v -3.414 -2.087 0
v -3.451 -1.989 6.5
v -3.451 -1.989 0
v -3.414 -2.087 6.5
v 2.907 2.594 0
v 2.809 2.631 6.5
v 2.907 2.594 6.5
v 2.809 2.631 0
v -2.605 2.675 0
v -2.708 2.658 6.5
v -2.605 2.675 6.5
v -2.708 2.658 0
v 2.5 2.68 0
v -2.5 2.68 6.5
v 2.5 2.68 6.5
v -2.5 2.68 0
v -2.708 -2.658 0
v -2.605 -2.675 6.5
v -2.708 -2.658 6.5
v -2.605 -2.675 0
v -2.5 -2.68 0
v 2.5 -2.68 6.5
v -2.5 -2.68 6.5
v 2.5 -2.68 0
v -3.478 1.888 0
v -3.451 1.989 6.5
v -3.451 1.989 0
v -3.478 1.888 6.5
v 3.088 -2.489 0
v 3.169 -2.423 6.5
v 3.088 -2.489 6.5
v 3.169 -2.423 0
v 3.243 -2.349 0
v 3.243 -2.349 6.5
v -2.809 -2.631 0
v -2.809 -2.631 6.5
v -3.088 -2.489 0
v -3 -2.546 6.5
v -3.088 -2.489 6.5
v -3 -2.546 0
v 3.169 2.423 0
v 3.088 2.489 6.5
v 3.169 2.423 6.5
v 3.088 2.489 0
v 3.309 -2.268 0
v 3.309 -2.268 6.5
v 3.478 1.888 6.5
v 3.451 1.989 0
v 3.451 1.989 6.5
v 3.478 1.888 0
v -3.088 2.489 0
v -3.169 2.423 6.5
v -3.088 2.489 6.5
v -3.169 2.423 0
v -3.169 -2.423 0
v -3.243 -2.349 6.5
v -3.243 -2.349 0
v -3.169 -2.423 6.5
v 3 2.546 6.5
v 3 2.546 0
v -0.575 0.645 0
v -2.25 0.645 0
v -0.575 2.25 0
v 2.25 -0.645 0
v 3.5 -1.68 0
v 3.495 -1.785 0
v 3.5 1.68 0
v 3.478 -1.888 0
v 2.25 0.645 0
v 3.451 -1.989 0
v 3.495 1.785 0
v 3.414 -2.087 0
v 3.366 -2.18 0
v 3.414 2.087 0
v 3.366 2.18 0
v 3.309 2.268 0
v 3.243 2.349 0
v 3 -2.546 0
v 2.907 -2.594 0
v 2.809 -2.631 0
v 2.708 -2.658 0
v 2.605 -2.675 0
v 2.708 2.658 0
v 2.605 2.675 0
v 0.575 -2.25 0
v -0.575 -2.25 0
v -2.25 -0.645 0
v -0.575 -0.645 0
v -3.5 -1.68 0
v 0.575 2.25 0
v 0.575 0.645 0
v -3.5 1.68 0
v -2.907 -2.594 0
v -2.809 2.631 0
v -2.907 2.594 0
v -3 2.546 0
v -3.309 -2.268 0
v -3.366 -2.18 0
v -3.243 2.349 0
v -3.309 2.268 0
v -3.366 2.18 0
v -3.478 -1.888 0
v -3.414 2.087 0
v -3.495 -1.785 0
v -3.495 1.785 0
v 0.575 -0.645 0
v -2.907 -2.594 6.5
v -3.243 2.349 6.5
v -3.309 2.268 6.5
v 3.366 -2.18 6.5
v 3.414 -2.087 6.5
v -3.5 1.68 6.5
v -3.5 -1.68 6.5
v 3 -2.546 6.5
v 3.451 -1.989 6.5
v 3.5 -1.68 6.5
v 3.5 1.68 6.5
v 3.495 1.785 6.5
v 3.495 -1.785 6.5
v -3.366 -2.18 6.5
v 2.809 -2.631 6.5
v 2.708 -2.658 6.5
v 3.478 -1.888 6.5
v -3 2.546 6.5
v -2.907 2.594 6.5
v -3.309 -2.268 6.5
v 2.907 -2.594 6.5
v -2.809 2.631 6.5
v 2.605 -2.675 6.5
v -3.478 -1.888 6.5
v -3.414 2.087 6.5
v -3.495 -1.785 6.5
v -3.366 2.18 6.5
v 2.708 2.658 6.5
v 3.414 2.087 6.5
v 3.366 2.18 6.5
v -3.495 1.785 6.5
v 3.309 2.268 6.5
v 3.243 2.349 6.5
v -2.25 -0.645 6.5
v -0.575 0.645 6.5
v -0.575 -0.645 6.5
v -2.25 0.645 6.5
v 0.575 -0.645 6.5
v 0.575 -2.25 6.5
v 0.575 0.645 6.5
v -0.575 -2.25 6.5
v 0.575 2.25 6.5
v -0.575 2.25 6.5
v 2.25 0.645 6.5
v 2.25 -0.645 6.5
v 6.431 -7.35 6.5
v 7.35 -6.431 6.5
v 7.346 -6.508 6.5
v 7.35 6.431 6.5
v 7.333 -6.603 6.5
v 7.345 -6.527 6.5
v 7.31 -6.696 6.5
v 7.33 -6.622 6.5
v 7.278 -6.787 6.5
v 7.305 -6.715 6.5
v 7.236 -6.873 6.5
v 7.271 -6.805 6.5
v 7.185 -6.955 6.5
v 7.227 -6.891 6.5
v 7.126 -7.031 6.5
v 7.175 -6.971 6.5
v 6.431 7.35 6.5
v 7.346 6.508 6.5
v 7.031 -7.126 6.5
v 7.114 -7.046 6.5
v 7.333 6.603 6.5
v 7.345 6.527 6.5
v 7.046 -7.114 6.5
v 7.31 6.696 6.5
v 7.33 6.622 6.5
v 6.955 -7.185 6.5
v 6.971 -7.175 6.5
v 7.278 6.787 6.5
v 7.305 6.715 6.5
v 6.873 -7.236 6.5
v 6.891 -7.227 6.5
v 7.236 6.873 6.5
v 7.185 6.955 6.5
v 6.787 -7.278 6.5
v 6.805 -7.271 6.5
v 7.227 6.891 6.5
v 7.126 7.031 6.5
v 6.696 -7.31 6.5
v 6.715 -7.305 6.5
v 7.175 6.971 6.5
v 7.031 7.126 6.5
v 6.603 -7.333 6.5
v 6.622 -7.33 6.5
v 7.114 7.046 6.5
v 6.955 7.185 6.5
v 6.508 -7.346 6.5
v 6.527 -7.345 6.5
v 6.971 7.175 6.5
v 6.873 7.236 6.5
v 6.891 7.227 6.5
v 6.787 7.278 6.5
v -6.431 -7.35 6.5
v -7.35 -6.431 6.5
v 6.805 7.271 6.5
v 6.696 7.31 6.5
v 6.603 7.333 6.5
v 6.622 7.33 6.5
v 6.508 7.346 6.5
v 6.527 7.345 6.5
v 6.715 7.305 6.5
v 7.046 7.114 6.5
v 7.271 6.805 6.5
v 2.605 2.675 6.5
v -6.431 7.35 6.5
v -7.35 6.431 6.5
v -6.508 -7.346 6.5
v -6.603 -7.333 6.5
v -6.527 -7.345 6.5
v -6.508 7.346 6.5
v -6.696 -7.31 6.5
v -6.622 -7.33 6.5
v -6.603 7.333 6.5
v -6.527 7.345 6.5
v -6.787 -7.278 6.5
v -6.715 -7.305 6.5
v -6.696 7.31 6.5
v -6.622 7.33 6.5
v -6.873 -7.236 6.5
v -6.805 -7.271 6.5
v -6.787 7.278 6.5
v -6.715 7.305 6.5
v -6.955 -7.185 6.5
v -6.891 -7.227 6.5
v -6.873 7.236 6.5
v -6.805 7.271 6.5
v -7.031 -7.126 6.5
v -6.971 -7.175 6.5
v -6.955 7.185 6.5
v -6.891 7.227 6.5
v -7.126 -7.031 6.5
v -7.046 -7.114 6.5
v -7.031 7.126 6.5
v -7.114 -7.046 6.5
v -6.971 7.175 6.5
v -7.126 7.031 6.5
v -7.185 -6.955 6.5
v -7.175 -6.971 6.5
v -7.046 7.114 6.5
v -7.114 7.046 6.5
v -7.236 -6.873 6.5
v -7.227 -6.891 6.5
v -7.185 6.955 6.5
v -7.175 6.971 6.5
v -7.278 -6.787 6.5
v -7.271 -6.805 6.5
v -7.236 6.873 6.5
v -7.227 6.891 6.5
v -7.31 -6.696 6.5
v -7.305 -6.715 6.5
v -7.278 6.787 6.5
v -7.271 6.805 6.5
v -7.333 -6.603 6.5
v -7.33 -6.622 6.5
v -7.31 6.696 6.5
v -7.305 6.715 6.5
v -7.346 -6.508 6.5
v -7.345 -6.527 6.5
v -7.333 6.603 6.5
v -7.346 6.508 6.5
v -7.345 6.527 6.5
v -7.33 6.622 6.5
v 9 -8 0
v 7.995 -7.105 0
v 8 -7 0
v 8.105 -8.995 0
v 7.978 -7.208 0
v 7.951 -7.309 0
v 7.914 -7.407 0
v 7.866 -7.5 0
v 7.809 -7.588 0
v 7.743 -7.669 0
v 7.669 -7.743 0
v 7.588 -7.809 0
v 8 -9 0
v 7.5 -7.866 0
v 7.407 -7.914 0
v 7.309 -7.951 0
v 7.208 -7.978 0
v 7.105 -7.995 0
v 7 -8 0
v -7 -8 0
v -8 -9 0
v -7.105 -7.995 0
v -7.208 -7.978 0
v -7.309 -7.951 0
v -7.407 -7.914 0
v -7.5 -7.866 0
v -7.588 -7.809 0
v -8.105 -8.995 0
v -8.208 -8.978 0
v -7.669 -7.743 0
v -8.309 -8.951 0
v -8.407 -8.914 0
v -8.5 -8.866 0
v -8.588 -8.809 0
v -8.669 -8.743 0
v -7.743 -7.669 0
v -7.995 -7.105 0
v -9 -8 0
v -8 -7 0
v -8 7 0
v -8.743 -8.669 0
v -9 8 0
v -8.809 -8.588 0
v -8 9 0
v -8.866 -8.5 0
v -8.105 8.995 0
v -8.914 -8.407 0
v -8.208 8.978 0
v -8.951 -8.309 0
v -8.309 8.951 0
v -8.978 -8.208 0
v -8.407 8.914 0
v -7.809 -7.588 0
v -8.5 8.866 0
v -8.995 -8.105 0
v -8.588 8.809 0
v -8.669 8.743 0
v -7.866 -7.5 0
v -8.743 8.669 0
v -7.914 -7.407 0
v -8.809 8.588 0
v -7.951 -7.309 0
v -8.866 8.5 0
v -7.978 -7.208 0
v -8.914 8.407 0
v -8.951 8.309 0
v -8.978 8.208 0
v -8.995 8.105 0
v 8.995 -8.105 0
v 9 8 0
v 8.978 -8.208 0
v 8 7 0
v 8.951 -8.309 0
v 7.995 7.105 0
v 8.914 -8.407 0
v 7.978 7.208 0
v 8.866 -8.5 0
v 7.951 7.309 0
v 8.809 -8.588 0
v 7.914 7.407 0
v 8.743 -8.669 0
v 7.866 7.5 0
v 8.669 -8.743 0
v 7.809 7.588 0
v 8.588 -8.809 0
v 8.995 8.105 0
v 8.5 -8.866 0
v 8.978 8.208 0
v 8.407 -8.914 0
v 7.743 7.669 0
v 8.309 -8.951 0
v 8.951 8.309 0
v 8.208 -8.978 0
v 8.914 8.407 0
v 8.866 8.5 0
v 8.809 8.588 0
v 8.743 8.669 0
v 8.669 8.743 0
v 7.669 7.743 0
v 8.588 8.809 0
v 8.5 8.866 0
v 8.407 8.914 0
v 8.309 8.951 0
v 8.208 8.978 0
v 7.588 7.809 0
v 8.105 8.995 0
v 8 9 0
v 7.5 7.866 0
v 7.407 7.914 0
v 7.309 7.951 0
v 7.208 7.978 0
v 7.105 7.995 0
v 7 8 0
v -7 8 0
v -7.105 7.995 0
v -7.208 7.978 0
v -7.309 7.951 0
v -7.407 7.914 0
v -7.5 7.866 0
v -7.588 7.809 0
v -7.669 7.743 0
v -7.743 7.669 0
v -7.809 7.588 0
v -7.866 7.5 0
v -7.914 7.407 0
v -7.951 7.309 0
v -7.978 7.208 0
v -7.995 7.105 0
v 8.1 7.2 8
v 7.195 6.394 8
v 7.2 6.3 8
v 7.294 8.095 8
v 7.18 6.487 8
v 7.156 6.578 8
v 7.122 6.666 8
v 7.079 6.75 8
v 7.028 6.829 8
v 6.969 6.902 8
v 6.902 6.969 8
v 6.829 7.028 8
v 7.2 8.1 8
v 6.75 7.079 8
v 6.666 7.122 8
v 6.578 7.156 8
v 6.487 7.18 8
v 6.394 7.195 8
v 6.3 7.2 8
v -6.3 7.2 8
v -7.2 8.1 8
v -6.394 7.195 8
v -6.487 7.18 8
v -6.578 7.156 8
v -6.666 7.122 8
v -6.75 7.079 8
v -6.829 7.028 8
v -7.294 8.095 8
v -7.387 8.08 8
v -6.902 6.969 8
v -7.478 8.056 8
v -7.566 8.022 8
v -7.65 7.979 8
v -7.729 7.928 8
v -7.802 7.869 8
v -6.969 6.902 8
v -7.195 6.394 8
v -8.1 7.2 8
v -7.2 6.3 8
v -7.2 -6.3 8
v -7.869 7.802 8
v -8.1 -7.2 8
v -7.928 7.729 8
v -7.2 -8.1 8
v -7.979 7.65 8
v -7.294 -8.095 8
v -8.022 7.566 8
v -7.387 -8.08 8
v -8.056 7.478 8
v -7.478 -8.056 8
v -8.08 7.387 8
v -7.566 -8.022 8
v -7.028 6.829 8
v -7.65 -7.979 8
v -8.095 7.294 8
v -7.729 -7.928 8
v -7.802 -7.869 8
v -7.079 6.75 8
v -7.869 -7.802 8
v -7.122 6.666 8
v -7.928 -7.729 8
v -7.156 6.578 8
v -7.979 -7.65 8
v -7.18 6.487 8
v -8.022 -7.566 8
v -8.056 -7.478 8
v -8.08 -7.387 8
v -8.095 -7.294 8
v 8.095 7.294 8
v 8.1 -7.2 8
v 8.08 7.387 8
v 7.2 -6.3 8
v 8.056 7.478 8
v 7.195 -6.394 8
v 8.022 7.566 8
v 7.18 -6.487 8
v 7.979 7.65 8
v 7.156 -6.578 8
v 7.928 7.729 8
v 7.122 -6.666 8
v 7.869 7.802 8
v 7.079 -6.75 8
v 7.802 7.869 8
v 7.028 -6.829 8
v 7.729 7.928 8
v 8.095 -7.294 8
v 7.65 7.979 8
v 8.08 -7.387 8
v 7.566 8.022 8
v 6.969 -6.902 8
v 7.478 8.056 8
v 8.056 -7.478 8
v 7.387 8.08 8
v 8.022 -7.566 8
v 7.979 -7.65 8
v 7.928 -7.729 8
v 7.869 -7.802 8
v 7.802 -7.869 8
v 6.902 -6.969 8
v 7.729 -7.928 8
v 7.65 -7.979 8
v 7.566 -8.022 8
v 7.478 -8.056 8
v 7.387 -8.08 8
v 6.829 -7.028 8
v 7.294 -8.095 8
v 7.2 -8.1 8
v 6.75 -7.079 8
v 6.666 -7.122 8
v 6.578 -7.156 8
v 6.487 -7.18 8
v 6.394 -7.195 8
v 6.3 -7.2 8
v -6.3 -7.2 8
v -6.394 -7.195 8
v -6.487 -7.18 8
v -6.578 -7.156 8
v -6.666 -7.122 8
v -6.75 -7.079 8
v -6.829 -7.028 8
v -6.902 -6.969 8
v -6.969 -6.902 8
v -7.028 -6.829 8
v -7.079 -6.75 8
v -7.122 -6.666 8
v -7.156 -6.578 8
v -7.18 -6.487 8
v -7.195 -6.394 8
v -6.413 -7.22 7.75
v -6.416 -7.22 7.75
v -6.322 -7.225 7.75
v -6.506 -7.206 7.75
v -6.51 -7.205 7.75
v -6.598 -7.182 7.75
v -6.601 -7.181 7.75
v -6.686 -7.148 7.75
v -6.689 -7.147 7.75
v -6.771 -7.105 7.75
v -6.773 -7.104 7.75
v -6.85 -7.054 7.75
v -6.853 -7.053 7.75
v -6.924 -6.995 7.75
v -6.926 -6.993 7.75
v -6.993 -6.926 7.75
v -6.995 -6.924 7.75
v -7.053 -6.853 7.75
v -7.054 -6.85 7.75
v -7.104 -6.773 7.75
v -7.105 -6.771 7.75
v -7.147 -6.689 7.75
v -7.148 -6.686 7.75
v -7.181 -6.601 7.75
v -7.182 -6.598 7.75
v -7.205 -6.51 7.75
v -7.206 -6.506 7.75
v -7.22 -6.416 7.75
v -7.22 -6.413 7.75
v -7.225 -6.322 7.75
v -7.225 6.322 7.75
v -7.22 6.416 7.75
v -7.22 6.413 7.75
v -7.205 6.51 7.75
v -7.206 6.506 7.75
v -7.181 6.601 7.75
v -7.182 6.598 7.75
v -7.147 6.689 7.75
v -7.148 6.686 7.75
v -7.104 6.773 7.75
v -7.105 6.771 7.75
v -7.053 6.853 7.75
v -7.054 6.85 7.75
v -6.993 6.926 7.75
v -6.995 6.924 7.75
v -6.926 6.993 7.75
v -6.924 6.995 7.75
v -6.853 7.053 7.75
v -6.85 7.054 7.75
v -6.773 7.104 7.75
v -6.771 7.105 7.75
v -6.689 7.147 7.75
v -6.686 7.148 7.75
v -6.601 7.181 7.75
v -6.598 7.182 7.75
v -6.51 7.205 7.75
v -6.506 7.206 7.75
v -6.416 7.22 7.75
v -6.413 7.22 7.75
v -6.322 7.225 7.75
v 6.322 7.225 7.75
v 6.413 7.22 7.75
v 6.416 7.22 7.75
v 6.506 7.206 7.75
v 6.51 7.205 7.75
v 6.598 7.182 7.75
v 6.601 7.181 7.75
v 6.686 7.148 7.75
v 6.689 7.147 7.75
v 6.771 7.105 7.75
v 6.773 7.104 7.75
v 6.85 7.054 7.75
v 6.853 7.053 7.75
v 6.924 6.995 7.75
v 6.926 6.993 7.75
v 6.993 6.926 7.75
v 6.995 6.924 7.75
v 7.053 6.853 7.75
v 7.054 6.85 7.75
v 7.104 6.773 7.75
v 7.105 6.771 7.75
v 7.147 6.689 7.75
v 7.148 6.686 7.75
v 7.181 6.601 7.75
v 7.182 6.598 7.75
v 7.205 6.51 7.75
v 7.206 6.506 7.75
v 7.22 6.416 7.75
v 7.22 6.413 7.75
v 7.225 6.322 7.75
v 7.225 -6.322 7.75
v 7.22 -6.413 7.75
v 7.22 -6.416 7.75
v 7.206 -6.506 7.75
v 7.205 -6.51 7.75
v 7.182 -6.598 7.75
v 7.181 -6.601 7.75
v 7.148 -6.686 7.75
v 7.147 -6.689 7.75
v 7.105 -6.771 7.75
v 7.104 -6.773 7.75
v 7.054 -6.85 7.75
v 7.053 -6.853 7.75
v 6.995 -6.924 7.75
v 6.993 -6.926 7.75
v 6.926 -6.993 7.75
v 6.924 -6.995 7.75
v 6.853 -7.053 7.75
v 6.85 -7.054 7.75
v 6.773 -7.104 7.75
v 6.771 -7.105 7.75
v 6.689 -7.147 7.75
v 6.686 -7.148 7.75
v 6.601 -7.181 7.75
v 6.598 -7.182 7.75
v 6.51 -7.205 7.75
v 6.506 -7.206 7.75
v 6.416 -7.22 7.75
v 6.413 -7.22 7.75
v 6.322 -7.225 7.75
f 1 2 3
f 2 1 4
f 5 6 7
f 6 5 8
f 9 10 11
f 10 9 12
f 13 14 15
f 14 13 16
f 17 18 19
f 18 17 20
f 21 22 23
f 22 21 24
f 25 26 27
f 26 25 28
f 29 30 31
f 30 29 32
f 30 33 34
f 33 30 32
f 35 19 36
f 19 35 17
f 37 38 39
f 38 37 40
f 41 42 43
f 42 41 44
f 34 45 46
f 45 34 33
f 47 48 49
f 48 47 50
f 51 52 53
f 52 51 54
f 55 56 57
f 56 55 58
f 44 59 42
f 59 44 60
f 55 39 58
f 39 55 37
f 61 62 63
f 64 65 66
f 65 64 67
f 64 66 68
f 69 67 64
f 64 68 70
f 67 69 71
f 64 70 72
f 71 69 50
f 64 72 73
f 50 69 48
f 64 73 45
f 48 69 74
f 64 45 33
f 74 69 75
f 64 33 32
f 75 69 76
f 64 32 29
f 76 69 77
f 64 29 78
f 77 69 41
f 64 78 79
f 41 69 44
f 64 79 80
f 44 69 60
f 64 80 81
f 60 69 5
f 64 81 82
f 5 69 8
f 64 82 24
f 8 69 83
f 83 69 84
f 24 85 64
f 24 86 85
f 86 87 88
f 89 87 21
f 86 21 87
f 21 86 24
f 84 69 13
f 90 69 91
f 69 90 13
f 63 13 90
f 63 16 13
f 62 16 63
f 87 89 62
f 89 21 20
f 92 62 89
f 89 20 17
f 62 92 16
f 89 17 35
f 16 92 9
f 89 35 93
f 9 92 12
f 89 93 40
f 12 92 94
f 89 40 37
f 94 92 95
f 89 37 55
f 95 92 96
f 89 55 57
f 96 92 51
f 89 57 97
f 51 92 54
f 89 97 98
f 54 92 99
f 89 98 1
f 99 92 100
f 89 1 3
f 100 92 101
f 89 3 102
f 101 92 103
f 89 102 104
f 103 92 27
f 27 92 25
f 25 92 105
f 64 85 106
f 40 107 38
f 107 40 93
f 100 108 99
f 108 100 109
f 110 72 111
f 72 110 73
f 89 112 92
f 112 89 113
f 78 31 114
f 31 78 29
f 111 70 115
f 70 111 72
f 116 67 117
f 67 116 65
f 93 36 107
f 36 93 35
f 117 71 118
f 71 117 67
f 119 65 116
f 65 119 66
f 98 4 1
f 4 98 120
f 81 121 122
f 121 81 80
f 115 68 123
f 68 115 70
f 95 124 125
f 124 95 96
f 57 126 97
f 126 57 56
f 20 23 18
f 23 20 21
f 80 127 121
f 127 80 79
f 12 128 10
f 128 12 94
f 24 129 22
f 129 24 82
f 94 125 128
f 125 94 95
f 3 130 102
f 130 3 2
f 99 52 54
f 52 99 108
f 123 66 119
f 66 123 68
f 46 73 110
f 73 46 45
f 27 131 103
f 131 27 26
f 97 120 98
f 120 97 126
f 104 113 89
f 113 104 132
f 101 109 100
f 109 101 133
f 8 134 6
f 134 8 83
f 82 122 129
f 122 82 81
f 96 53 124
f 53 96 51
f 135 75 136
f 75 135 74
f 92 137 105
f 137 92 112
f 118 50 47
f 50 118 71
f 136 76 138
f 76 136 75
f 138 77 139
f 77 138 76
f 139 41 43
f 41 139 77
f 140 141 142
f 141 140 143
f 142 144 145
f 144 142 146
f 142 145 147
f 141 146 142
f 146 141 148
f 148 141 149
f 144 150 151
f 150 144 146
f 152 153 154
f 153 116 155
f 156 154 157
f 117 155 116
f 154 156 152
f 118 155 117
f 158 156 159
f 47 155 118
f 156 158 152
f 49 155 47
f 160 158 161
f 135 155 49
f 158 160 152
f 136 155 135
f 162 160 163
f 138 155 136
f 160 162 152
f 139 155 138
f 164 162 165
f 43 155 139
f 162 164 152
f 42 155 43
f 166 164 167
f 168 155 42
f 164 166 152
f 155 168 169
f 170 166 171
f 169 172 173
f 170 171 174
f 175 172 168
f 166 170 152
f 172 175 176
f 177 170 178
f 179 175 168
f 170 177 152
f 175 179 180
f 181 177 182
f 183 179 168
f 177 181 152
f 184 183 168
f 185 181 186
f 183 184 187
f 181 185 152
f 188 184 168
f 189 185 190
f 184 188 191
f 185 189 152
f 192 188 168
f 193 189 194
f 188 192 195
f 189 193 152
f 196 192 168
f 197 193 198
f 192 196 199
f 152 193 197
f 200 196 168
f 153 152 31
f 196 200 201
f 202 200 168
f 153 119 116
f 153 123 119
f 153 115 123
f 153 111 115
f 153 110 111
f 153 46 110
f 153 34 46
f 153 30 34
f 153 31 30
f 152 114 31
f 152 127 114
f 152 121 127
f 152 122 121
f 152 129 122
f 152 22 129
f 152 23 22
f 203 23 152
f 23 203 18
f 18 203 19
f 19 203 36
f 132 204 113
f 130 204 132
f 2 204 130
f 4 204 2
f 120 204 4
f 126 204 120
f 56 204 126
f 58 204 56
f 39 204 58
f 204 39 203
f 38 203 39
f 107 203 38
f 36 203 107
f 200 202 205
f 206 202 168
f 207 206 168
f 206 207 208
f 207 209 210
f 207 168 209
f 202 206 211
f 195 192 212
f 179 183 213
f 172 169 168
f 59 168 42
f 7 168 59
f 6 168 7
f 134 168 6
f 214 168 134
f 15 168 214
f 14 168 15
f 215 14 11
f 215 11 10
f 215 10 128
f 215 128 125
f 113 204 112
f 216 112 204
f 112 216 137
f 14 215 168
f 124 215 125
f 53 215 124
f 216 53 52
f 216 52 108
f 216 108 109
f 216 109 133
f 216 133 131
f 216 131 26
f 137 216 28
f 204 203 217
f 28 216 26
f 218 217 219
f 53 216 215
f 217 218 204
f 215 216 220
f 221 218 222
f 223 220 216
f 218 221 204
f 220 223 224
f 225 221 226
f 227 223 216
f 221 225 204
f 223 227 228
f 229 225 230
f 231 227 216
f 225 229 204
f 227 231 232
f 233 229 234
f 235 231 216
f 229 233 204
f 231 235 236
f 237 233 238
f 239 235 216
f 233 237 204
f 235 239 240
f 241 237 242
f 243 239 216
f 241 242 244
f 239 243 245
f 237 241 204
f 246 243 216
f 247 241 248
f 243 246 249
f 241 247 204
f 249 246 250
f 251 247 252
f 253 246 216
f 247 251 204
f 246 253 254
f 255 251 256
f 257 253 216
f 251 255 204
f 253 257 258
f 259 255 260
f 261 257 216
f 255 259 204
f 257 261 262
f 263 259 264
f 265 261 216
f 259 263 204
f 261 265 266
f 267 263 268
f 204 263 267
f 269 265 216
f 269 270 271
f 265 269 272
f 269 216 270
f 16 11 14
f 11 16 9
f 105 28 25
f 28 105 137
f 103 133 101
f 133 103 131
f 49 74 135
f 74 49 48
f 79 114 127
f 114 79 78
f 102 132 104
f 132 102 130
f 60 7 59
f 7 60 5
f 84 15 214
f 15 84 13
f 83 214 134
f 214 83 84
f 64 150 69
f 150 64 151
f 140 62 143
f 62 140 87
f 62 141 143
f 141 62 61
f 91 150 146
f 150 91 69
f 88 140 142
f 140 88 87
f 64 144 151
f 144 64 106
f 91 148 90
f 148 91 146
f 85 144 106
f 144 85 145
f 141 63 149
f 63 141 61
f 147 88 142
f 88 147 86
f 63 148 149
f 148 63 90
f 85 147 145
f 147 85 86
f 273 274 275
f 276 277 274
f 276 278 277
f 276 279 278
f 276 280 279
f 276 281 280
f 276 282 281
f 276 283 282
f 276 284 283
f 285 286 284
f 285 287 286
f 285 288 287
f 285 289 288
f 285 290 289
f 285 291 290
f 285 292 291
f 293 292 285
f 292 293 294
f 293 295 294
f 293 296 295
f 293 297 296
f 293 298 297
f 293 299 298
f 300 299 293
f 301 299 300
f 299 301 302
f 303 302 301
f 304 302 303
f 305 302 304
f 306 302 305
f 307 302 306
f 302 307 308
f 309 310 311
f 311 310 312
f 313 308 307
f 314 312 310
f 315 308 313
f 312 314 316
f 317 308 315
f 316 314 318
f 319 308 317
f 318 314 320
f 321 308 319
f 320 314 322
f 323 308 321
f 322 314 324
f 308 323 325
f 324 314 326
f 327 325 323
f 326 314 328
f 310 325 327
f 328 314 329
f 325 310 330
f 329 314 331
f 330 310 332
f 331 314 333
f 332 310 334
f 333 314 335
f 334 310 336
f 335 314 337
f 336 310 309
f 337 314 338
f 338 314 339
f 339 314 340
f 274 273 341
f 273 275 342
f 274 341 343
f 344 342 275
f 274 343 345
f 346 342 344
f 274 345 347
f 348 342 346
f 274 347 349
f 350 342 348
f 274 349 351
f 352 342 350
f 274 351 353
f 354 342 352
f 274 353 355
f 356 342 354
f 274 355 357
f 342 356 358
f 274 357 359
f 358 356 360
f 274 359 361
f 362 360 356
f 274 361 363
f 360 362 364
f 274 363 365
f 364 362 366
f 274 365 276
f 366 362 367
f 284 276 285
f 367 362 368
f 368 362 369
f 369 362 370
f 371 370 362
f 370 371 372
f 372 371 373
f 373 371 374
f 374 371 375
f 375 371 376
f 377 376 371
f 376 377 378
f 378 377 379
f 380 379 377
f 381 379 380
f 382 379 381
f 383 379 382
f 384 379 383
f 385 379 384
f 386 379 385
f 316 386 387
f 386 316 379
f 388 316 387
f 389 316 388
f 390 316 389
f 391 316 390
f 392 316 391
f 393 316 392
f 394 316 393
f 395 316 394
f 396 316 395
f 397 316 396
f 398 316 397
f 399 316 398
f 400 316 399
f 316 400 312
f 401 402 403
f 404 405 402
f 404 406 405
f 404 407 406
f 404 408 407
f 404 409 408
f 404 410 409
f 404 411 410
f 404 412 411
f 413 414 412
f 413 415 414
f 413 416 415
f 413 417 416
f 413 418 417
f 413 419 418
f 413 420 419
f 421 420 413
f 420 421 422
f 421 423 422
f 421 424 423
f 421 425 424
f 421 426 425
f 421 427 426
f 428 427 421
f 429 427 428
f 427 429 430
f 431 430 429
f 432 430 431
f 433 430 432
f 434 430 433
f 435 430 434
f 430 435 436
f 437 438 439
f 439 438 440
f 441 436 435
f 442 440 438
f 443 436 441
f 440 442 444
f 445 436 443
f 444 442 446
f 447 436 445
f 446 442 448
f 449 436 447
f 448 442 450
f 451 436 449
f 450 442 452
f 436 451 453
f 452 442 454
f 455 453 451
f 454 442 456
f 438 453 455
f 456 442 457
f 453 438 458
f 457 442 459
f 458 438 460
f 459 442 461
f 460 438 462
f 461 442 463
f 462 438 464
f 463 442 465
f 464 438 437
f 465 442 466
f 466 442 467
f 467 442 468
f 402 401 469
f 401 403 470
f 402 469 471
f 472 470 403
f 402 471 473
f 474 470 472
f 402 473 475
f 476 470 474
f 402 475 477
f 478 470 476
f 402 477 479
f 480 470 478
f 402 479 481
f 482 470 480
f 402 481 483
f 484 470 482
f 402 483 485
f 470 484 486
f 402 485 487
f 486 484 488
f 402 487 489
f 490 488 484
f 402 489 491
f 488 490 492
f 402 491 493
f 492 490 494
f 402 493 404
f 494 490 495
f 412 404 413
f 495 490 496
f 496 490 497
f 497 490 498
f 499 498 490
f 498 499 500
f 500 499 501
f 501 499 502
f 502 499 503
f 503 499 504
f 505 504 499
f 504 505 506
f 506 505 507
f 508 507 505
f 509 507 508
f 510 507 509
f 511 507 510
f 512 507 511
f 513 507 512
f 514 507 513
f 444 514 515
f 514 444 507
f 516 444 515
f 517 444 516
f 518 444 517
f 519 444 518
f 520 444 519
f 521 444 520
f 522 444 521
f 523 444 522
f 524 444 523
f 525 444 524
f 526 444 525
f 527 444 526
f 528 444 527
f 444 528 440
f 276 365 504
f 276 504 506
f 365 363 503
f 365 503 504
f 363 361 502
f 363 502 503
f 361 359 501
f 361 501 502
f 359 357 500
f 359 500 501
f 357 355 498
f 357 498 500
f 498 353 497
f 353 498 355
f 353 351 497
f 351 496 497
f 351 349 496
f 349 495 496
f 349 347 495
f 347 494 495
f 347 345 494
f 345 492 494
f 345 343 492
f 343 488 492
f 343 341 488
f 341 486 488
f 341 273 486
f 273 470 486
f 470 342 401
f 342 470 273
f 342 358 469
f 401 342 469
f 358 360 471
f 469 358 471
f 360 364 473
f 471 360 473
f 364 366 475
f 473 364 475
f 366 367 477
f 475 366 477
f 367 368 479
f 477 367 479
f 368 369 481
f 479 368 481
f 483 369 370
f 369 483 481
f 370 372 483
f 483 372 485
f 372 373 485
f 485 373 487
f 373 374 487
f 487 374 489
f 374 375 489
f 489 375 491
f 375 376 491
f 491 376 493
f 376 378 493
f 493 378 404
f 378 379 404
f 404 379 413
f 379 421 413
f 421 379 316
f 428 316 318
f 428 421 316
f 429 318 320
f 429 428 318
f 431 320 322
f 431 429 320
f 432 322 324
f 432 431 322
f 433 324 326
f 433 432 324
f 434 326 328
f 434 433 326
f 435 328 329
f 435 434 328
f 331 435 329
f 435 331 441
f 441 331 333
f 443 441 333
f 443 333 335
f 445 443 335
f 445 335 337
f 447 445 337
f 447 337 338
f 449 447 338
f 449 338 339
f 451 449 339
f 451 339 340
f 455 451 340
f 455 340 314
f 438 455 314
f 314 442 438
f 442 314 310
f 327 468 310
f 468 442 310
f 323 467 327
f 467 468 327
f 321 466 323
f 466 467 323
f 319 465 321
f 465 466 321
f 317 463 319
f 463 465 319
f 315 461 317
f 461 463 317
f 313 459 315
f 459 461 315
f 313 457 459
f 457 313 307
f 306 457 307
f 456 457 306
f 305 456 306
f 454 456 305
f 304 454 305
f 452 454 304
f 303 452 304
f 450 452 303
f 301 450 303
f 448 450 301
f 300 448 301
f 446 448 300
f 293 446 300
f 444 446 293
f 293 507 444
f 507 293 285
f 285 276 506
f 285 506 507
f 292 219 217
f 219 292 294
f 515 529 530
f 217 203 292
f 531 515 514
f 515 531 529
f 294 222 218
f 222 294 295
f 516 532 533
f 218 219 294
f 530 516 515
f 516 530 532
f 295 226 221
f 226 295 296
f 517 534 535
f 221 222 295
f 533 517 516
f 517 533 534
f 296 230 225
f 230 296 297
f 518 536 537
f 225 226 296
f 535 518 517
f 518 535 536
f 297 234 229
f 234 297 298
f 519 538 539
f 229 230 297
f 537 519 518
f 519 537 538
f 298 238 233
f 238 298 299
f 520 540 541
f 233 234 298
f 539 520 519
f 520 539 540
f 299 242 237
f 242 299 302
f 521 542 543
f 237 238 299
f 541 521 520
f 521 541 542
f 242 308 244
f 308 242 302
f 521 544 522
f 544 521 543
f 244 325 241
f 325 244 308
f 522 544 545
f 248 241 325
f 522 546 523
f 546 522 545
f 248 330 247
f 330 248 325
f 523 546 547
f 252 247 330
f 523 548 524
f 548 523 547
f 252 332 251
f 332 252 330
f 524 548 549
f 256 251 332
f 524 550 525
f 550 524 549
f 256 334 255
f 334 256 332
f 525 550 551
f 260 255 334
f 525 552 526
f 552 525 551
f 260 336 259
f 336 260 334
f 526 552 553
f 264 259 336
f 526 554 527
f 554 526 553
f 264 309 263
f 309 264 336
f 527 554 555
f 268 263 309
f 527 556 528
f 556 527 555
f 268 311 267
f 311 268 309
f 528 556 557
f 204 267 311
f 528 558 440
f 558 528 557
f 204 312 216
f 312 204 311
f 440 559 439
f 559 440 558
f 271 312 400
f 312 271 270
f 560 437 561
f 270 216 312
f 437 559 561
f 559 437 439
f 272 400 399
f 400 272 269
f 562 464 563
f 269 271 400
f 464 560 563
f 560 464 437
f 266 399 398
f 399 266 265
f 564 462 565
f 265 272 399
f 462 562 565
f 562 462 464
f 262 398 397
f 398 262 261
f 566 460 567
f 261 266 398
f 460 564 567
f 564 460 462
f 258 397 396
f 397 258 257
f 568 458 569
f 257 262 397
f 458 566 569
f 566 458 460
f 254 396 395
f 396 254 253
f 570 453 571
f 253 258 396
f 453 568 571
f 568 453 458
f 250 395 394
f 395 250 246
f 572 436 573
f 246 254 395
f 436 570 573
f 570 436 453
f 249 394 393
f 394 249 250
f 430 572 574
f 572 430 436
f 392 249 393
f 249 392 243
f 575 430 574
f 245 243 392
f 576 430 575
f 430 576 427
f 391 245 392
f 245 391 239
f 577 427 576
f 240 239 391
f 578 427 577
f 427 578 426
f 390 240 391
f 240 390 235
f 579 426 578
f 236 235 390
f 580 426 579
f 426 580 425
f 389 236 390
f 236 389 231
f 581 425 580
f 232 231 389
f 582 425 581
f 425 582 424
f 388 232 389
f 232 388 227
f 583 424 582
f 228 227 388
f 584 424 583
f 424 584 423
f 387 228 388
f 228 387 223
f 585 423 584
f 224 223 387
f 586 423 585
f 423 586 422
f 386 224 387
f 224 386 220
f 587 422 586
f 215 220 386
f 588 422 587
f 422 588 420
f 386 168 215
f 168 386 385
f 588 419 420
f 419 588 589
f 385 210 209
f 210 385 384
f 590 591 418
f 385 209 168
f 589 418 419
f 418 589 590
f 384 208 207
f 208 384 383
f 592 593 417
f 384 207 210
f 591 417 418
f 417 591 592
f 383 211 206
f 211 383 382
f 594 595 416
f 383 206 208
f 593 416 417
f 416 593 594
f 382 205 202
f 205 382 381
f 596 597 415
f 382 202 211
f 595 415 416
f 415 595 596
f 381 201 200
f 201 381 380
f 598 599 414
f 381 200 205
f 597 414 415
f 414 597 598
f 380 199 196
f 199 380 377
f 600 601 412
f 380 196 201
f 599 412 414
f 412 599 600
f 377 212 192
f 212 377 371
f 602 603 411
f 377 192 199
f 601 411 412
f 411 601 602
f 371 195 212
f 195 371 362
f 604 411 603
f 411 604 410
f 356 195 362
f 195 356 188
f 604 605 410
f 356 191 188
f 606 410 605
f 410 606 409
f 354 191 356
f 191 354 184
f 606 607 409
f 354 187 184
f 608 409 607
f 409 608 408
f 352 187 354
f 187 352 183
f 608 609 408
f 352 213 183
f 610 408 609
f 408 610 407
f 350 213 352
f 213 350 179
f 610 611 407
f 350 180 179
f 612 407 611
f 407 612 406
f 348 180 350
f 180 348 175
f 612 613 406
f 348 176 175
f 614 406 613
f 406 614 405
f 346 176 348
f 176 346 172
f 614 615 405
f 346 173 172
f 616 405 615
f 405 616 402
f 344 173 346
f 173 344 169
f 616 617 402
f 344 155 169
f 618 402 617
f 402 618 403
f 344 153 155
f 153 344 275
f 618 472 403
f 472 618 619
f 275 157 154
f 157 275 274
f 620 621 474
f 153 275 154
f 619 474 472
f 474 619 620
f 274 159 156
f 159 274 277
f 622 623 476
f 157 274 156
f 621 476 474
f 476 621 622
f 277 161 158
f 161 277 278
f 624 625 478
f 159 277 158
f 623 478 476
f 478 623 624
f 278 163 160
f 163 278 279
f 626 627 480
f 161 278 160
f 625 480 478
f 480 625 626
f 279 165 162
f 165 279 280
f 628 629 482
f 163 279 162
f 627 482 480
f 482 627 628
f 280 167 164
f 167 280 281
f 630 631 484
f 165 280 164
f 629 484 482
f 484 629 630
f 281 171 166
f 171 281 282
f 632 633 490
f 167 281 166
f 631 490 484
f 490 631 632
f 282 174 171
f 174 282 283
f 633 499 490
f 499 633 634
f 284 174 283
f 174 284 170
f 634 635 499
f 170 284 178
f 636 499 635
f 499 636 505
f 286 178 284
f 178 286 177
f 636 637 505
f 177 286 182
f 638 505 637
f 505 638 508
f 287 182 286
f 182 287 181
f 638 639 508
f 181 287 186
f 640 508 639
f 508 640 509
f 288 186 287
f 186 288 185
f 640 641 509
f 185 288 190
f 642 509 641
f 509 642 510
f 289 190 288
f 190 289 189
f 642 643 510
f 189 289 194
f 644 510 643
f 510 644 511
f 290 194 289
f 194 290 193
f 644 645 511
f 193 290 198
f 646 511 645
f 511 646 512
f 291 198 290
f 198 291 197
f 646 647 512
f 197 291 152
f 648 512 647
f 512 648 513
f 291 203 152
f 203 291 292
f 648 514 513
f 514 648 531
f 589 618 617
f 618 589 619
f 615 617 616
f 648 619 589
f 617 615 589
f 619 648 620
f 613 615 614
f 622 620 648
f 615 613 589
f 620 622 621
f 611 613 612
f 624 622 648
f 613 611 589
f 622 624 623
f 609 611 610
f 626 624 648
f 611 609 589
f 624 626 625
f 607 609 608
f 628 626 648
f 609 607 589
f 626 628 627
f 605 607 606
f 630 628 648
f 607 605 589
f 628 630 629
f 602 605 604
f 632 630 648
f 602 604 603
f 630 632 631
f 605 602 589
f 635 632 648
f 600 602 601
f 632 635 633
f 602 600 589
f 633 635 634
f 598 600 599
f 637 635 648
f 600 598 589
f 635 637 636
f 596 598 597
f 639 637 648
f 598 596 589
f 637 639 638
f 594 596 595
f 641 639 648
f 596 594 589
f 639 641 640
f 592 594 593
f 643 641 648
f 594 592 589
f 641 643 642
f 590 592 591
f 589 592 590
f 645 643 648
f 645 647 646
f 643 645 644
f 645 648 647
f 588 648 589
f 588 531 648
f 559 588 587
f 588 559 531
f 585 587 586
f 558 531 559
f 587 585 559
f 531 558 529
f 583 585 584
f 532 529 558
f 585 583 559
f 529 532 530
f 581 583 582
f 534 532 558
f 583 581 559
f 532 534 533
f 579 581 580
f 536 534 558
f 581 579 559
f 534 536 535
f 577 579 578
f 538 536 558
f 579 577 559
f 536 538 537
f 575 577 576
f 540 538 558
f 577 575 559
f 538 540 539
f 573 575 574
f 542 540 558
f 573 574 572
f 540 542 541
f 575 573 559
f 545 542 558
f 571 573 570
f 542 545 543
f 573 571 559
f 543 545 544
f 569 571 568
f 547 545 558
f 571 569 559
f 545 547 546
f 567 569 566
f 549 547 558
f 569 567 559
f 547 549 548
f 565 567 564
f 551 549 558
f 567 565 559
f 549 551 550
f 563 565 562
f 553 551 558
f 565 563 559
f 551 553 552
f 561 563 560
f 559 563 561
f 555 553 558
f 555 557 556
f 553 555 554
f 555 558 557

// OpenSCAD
// Define higher resolution for transformations

$fn=60;

union() {
    // sides
    color("#FFA500")
    linear_extrude(height = 8, scale=0.90)
    difference() {
        offset(r=1) square(16, true);
        offset(r=1) square(14, true);
    }

    // top ceiling
    color("#FF8C00")
    translate([0,0,6.5])
        linear_extrude(height = 1.25)
        offset(r=1)
        square(13, true);

    // fitting support
    color("#FF7F50")
    translate([0, 0, 3.25])
    difference(){
        // housing fitting
        hull() {
            translate([2.50, 1.68, 0])   cylinder(6.5, 1, 1, true);
            translate([-2.50, 1.68, 0])  cylinder(6.5, 1, 1, true);
            translate([2.50, -1.68, 0])  cylinder(6.5, 1, 1, true);
            translate([-2.50, -1.68, 0]) cylinder(6.5, 1, 1, true);
        }
        // cross fitting cutoff
        cube([4.5, 1.29, 10], true);
        cube([1.15, 4.5, 10], true);
    }
}
